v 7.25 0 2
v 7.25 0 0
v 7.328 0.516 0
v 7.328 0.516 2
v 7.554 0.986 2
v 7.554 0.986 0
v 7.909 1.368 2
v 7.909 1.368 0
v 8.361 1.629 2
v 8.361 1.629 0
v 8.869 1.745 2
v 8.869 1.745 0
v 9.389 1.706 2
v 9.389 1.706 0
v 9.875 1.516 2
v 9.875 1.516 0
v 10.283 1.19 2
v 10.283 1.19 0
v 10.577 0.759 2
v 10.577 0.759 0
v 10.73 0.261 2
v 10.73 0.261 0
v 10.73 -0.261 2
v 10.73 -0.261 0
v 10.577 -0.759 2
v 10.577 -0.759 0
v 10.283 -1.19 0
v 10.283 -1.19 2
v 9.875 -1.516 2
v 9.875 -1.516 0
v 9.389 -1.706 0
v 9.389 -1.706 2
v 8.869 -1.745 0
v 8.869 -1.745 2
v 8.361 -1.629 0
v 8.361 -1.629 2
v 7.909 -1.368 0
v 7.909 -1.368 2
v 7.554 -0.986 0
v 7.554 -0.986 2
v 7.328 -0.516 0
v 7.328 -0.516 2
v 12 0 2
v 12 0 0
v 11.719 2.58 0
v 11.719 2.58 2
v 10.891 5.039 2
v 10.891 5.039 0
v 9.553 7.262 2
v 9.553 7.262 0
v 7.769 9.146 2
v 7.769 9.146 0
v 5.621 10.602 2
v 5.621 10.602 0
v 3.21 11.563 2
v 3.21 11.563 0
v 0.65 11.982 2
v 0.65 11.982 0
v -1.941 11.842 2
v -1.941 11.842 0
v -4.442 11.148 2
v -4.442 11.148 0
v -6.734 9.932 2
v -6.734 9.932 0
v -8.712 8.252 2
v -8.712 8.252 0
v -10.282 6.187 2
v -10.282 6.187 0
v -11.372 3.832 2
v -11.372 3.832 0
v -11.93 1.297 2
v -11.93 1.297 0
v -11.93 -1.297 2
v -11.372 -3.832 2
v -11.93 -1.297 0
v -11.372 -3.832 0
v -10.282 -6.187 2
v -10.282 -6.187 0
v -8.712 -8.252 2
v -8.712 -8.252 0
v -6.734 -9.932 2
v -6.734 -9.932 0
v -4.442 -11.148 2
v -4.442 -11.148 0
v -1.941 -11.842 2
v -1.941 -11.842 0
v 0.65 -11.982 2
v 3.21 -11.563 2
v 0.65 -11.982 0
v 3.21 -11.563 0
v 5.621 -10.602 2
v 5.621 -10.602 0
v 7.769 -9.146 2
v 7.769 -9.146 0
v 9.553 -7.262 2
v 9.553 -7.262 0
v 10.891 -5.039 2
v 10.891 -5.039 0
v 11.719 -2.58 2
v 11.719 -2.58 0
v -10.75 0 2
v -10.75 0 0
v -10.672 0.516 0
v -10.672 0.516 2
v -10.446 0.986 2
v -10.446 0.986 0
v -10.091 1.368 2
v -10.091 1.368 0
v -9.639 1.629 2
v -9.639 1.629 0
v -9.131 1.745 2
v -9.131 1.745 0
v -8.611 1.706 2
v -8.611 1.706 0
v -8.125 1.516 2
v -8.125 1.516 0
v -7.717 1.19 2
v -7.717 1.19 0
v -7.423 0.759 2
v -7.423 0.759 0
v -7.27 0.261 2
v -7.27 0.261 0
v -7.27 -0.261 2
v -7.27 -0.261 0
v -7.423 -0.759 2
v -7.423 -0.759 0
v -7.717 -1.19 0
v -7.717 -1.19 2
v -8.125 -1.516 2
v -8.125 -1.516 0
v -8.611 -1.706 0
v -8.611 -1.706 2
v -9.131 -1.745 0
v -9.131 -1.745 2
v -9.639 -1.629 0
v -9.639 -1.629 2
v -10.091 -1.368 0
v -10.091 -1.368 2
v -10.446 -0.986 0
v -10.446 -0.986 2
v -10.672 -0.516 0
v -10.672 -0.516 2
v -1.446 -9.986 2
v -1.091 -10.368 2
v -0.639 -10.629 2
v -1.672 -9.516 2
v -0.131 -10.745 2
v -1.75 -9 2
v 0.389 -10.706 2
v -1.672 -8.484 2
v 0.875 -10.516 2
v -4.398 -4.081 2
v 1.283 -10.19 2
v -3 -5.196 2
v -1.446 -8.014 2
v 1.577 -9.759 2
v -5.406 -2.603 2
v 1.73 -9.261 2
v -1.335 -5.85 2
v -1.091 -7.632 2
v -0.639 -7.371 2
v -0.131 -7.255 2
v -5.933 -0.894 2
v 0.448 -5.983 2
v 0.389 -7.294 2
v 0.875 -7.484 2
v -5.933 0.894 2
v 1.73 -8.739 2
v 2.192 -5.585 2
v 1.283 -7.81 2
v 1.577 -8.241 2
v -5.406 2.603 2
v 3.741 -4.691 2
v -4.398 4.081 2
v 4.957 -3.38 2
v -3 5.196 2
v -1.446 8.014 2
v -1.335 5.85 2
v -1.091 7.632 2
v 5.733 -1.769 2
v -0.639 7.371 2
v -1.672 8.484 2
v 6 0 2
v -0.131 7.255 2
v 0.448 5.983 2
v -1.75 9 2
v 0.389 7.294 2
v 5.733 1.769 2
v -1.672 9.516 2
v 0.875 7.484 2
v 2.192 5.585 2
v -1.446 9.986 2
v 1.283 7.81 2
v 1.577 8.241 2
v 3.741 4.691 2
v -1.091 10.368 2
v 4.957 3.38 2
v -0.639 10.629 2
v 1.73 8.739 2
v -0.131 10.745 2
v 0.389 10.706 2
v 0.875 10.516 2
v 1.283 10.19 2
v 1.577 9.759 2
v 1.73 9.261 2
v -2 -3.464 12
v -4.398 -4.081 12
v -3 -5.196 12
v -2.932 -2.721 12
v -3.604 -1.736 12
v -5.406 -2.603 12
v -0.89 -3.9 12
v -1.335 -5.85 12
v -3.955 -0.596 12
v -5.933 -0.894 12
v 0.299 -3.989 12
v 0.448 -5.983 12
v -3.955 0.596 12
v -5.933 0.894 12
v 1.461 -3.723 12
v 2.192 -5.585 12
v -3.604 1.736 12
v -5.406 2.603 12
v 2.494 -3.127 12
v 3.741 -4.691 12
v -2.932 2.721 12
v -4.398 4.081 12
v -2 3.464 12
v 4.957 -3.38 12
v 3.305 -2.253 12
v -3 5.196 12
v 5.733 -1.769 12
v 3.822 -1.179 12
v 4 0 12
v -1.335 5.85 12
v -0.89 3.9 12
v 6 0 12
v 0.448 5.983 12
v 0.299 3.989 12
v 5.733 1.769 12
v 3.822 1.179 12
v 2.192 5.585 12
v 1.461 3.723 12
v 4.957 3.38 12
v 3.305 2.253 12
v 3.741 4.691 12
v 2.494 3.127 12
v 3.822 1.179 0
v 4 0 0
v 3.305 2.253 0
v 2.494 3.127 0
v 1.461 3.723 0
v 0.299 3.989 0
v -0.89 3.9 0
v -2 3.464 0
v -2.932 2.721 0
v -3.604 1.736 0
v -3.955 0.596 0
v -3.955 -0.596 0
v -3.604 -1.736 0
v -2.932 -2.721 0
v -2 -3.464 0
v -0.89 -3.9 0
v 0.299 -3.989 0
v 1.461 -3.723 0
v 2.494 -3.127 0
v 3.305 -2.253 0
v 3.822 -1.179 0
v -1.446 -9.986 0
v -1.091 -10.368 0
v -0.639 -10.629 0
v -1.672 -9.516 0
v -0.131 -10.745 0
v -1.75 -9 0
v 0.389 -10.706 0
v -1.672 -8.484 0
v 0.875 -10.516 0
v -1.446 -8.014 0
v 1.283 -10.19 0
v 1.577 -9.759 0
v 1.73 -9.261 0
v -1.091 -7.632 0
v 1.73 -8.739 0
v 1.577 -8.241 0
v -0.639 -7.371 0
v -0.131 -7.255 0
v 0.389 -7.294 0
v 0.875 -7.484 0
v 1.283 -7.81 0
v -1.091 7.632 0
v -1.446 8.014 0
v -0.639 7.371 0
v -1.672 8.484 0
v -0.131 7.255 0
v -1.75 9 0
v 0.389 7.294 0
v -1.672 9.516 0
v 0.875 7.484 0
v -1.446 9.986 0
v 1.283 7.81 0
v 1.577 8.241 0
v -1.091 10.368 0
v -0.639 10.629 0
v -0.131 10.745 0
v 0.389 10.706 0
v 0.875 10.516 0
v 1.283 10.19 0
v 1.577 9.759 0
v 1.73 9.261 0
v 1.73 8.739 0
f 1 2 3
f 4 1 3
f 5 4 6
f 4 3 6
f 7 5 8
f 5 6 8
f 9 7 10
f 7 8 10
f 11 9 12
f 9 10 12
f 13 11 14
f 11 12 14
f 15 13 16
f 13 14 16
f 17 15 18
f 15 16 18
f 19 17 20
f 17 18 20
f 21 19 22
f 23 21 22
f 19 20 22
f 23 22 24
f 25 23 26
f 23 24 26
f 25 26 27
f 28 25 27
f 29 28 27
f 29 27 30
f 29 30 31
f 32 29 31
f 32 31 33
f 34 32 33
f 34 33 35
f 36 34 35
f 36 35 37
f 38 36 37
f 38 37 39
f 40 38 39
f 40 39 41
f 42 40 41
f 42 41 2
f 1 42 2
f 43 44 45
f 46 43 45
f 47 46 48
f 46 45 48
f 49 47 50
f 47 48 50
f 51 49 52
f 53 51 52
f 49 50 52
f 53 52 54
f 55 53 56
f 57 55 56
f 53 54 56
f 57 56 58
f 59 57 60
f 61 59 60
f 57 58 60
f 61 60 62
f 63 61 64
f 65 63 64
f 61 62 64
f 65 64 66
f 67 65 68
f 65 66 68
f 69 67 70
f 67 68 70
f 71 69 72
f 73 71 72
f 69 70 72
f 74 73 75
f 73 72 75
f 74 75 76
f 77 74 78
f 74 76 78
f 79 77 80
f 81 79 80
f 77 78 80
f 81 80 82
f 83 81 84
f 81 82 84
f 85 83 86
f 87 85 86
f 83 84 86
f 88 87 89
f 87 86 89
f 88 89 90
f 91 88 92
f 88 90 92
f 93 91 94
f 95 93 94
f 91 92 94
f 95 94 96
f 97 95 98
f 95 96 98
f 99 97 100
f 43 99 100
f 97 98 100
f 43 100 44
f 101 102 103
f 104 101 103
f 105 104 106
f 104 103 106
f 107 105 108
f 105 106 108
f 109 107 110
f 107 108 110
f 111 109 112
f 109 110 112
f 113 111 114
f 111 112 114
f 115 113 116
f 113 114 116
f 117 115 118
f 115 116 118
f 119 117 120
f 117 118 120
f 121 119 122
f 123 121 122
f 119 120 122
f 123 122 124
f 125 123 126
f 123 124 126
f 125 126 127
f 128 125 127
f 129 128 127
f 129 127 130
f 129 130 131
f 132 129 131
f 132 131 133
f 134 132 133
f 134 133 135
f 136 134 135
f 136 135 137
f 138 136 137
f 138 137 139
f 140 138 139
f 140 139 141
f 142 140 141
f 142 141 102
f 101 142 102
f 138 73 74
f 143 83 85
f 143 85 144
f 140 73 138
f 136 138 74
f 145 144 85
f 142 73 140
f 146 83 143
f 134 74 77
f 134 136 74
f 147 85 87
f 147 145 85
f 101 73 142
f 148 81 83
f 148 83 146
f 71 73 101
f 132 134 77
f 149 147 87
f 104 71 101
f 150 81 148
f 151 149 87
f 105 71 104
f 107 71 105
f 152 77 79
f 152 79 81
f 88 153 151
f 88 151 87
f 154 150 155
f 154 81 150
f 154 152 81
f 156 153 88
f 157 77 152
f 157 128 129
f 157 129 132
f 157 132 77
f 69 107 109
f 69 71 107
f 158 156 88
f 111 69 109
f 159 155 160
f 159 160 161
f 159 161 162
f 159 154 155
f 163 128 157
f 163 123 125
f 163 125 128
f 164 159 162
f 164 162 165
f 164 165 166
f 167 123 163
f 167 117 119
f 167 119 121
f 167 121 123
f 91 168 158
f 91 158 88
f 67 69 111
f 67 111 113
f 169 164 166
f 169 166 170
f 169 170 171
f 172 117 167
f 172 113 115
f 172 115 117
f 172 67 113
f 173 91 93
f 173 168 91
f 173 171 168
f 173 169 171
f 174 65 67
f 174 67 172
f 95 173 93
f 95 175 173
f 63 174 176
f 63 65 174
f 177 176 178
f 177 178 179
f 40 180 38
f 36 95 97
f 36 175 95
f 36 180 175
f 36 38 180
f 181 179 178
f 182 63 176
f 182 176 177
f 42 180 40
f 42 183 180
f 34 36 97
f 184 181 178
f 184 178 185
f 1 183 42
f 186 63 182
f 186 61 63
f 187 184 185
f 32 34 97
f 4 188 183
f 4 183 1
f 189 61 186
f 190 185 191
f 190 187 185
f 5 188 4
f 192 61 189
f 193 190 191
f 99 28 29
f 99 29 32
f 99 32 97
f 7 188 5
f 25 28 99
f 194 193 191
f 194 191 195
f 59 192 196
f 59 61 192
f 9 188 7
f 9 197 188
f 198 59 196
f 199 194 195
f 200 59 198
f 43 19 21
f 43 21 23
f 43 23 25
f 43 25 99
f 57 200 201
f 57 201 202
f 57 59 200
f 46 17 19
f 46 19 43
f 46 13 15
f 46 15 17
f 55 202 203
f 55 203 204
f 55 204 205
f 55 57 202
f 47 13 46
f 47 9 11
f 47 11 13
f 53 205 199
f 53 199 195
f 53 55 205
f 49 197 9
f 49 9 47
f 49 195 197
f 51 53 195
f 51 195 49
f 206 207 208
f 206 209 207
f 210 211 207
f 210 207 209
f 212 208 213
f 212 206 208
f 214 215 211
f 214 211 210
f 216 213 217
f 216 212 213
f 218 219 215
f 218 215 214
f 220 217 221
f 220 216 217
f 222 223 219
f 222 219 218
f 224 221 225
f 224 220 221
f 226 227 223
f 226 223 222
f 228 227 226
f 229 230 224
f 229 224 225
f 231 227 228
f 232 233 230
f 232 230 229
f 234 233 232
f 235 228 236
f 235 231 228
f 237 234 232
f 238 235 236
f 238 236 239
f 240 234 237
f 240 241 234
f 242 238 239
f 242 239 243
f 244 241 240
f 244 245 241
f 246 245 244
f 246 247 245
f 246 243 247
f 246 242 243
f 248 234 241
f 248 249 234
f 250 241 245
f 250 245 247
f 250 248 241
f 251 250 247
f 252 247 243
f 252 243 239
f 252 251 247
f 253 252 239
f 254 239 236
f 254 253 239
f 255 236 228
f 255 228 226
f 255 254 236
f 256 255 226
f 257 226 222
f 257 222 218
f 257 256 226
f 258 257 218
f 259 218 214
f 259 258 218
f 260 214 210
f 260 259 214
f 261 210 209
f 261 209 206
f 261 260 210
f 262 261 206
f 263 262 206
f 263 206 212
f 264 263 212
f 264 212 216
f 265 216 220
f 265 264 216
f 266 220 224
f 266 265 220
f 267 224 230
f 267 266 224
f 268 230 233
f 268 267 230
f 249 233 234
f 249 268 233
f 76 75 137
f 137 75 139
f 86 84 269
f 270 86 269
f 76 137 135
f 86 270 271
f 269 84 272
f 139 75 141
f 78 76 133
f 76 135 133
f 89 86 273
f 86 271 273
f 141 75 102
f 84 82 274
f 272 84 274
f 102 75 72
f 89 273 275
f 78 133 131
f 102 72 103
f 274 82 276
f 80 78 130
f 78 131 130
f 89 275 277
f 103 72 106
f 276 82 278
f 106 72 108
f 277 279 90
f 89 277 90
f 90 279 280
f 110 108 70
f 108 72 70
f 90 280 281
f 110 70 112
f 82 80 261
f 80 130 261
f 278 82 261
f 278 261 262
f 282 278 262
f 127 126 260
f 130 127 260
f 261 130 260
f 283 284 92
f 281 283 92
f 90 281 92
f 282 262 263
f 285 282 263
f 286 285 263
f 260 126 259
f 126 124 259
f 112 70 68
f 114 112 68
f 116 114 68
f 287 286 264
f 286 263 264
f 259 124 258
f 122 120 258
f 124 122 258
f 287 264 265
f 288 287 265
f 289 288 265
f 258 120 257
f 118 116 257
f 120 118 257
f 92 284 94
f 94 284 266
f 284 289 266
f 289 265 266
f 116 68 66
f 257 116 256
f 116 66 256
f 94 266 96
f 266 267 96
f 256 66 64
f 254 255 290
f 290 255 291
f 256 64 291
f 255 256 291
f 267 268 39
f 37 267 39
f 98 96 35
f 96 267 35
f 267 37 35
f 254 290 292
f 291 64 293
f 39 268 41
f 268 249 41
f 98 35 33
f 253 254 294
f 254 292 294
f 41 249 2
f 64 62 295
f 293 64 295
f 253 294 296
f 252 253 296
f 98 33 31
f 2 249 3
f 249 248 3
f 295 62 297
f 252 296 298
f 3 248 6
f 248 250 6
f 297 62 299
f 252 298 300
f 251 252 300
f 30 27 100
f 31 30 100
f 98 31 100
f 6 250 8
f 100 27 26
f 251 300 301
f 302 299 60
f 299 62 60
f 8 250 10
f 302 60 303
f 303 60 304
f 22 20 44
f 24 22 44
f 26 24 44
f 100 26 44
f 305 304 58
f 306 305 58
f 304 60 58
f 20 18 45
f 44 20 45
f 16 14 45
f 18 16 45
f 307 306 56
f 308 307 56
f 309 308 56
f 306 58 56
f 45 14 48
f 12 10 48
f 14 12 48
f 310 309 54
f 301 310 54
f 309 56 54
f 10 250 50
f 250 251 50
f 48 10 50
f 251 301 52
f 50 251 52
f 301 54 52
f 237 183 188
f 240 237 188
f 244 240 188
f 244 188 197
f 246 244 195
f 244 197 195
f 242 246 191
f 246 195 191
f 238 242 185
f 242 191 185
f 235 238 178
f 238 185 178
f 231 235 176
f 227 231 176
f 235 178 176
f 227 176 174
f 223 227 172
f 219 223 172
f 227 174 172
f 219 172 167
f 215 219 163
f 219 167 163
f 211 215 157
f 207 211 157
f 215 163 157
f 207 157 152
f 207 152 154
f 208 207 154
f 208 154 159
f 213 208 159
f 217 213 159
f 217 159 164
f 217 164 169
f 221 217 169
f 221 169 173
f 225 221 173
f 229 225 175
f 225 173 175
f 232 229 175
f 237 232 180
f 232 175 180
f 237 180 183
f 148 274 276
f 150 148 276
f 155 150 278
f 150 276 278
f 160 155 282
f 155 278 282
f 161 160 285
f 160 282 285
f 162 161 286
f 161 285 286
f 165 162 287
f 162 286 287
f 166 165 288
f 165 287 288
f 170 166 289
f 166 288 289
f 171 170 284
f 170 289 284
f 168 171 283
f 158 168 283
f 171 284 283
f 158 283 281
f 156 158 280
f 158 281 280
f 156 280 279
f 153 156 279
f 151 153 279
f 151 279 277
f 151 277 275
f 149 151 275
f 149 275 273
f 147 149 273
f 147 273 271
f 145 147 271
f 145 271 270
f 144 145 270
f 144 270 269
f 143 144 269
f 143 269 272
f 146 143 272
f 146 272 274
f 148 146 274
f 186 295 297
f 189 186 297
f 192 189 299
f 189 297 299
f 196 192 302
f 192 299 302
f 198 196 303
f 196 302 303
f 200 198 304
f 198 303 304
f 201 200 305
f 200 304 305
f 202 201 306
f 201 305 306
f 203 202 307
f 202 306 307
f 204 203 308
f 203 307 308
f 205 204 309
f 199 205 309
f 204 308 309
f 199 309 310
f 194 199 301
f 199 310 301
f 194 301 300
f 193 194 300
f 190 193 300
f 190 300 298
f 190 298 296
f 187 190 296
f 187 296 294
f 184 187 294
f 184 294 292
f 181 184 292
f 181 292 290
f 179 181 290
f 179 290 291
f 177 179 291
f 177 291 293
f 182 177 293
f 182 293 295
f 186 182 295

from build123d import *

# Parameters (mm, degrees)
SKETCH_1_R          = 12
SKETCH_1_R_2        = 4
EXTRUDE_1_DEPTH     = 2
SKETCH_2_R          = 6
SKETCH_2_R_2        = 4
EXTRUDE_3_DEPTH     = 10
SKETCH_4_R          = 1.75
CUT_EXTRUDE_1_DEPTH = 16.7


with BuildPart() as part:
    # 草图1 → 凸台-拉伸1 (new body)
    with BuildSketch(Plane.XY):
        Circle(SKETCH_1_R)
        Circle(SKETCH_1_R_2, mode=Mode.SUBTRACT)
    extrude(amount=EXTRUDE_1_DEPTH)

    # 草图2 → 凸台-拉伸3 (add)
    with BuildSketch(Plane.XY.offset(2)):
        Circle(SKETCH_2_R)
        Circle(SKETCH_2_R_2, mode=Mode.SUBTRACT)
    extrude(amount=EXTRUDE_3_DEPTH)

    # 草图4 → 切除-拉伸1 (cut)
    with BuildSketch(Plane(origin=(0, 0, 0), x_dir=(-1, 0, 0), z_dir=(0, 0, -1))):
        with Locations((9, 0)):
            Circle(SKETCH_4_R)
        with Locations((0, 9)):
            Circle(SKETCH_4_R)
        with Locations((-9, 0)):
            Circle(SKETCH_4_R)
        with Locations((0, -9)):
            Circle(SKETCH_4_R)
    extrude(amount=-CUT_EXTRUDE_1_DEPTH, mode=Mode.SUBTRACT)


solid = part.part
